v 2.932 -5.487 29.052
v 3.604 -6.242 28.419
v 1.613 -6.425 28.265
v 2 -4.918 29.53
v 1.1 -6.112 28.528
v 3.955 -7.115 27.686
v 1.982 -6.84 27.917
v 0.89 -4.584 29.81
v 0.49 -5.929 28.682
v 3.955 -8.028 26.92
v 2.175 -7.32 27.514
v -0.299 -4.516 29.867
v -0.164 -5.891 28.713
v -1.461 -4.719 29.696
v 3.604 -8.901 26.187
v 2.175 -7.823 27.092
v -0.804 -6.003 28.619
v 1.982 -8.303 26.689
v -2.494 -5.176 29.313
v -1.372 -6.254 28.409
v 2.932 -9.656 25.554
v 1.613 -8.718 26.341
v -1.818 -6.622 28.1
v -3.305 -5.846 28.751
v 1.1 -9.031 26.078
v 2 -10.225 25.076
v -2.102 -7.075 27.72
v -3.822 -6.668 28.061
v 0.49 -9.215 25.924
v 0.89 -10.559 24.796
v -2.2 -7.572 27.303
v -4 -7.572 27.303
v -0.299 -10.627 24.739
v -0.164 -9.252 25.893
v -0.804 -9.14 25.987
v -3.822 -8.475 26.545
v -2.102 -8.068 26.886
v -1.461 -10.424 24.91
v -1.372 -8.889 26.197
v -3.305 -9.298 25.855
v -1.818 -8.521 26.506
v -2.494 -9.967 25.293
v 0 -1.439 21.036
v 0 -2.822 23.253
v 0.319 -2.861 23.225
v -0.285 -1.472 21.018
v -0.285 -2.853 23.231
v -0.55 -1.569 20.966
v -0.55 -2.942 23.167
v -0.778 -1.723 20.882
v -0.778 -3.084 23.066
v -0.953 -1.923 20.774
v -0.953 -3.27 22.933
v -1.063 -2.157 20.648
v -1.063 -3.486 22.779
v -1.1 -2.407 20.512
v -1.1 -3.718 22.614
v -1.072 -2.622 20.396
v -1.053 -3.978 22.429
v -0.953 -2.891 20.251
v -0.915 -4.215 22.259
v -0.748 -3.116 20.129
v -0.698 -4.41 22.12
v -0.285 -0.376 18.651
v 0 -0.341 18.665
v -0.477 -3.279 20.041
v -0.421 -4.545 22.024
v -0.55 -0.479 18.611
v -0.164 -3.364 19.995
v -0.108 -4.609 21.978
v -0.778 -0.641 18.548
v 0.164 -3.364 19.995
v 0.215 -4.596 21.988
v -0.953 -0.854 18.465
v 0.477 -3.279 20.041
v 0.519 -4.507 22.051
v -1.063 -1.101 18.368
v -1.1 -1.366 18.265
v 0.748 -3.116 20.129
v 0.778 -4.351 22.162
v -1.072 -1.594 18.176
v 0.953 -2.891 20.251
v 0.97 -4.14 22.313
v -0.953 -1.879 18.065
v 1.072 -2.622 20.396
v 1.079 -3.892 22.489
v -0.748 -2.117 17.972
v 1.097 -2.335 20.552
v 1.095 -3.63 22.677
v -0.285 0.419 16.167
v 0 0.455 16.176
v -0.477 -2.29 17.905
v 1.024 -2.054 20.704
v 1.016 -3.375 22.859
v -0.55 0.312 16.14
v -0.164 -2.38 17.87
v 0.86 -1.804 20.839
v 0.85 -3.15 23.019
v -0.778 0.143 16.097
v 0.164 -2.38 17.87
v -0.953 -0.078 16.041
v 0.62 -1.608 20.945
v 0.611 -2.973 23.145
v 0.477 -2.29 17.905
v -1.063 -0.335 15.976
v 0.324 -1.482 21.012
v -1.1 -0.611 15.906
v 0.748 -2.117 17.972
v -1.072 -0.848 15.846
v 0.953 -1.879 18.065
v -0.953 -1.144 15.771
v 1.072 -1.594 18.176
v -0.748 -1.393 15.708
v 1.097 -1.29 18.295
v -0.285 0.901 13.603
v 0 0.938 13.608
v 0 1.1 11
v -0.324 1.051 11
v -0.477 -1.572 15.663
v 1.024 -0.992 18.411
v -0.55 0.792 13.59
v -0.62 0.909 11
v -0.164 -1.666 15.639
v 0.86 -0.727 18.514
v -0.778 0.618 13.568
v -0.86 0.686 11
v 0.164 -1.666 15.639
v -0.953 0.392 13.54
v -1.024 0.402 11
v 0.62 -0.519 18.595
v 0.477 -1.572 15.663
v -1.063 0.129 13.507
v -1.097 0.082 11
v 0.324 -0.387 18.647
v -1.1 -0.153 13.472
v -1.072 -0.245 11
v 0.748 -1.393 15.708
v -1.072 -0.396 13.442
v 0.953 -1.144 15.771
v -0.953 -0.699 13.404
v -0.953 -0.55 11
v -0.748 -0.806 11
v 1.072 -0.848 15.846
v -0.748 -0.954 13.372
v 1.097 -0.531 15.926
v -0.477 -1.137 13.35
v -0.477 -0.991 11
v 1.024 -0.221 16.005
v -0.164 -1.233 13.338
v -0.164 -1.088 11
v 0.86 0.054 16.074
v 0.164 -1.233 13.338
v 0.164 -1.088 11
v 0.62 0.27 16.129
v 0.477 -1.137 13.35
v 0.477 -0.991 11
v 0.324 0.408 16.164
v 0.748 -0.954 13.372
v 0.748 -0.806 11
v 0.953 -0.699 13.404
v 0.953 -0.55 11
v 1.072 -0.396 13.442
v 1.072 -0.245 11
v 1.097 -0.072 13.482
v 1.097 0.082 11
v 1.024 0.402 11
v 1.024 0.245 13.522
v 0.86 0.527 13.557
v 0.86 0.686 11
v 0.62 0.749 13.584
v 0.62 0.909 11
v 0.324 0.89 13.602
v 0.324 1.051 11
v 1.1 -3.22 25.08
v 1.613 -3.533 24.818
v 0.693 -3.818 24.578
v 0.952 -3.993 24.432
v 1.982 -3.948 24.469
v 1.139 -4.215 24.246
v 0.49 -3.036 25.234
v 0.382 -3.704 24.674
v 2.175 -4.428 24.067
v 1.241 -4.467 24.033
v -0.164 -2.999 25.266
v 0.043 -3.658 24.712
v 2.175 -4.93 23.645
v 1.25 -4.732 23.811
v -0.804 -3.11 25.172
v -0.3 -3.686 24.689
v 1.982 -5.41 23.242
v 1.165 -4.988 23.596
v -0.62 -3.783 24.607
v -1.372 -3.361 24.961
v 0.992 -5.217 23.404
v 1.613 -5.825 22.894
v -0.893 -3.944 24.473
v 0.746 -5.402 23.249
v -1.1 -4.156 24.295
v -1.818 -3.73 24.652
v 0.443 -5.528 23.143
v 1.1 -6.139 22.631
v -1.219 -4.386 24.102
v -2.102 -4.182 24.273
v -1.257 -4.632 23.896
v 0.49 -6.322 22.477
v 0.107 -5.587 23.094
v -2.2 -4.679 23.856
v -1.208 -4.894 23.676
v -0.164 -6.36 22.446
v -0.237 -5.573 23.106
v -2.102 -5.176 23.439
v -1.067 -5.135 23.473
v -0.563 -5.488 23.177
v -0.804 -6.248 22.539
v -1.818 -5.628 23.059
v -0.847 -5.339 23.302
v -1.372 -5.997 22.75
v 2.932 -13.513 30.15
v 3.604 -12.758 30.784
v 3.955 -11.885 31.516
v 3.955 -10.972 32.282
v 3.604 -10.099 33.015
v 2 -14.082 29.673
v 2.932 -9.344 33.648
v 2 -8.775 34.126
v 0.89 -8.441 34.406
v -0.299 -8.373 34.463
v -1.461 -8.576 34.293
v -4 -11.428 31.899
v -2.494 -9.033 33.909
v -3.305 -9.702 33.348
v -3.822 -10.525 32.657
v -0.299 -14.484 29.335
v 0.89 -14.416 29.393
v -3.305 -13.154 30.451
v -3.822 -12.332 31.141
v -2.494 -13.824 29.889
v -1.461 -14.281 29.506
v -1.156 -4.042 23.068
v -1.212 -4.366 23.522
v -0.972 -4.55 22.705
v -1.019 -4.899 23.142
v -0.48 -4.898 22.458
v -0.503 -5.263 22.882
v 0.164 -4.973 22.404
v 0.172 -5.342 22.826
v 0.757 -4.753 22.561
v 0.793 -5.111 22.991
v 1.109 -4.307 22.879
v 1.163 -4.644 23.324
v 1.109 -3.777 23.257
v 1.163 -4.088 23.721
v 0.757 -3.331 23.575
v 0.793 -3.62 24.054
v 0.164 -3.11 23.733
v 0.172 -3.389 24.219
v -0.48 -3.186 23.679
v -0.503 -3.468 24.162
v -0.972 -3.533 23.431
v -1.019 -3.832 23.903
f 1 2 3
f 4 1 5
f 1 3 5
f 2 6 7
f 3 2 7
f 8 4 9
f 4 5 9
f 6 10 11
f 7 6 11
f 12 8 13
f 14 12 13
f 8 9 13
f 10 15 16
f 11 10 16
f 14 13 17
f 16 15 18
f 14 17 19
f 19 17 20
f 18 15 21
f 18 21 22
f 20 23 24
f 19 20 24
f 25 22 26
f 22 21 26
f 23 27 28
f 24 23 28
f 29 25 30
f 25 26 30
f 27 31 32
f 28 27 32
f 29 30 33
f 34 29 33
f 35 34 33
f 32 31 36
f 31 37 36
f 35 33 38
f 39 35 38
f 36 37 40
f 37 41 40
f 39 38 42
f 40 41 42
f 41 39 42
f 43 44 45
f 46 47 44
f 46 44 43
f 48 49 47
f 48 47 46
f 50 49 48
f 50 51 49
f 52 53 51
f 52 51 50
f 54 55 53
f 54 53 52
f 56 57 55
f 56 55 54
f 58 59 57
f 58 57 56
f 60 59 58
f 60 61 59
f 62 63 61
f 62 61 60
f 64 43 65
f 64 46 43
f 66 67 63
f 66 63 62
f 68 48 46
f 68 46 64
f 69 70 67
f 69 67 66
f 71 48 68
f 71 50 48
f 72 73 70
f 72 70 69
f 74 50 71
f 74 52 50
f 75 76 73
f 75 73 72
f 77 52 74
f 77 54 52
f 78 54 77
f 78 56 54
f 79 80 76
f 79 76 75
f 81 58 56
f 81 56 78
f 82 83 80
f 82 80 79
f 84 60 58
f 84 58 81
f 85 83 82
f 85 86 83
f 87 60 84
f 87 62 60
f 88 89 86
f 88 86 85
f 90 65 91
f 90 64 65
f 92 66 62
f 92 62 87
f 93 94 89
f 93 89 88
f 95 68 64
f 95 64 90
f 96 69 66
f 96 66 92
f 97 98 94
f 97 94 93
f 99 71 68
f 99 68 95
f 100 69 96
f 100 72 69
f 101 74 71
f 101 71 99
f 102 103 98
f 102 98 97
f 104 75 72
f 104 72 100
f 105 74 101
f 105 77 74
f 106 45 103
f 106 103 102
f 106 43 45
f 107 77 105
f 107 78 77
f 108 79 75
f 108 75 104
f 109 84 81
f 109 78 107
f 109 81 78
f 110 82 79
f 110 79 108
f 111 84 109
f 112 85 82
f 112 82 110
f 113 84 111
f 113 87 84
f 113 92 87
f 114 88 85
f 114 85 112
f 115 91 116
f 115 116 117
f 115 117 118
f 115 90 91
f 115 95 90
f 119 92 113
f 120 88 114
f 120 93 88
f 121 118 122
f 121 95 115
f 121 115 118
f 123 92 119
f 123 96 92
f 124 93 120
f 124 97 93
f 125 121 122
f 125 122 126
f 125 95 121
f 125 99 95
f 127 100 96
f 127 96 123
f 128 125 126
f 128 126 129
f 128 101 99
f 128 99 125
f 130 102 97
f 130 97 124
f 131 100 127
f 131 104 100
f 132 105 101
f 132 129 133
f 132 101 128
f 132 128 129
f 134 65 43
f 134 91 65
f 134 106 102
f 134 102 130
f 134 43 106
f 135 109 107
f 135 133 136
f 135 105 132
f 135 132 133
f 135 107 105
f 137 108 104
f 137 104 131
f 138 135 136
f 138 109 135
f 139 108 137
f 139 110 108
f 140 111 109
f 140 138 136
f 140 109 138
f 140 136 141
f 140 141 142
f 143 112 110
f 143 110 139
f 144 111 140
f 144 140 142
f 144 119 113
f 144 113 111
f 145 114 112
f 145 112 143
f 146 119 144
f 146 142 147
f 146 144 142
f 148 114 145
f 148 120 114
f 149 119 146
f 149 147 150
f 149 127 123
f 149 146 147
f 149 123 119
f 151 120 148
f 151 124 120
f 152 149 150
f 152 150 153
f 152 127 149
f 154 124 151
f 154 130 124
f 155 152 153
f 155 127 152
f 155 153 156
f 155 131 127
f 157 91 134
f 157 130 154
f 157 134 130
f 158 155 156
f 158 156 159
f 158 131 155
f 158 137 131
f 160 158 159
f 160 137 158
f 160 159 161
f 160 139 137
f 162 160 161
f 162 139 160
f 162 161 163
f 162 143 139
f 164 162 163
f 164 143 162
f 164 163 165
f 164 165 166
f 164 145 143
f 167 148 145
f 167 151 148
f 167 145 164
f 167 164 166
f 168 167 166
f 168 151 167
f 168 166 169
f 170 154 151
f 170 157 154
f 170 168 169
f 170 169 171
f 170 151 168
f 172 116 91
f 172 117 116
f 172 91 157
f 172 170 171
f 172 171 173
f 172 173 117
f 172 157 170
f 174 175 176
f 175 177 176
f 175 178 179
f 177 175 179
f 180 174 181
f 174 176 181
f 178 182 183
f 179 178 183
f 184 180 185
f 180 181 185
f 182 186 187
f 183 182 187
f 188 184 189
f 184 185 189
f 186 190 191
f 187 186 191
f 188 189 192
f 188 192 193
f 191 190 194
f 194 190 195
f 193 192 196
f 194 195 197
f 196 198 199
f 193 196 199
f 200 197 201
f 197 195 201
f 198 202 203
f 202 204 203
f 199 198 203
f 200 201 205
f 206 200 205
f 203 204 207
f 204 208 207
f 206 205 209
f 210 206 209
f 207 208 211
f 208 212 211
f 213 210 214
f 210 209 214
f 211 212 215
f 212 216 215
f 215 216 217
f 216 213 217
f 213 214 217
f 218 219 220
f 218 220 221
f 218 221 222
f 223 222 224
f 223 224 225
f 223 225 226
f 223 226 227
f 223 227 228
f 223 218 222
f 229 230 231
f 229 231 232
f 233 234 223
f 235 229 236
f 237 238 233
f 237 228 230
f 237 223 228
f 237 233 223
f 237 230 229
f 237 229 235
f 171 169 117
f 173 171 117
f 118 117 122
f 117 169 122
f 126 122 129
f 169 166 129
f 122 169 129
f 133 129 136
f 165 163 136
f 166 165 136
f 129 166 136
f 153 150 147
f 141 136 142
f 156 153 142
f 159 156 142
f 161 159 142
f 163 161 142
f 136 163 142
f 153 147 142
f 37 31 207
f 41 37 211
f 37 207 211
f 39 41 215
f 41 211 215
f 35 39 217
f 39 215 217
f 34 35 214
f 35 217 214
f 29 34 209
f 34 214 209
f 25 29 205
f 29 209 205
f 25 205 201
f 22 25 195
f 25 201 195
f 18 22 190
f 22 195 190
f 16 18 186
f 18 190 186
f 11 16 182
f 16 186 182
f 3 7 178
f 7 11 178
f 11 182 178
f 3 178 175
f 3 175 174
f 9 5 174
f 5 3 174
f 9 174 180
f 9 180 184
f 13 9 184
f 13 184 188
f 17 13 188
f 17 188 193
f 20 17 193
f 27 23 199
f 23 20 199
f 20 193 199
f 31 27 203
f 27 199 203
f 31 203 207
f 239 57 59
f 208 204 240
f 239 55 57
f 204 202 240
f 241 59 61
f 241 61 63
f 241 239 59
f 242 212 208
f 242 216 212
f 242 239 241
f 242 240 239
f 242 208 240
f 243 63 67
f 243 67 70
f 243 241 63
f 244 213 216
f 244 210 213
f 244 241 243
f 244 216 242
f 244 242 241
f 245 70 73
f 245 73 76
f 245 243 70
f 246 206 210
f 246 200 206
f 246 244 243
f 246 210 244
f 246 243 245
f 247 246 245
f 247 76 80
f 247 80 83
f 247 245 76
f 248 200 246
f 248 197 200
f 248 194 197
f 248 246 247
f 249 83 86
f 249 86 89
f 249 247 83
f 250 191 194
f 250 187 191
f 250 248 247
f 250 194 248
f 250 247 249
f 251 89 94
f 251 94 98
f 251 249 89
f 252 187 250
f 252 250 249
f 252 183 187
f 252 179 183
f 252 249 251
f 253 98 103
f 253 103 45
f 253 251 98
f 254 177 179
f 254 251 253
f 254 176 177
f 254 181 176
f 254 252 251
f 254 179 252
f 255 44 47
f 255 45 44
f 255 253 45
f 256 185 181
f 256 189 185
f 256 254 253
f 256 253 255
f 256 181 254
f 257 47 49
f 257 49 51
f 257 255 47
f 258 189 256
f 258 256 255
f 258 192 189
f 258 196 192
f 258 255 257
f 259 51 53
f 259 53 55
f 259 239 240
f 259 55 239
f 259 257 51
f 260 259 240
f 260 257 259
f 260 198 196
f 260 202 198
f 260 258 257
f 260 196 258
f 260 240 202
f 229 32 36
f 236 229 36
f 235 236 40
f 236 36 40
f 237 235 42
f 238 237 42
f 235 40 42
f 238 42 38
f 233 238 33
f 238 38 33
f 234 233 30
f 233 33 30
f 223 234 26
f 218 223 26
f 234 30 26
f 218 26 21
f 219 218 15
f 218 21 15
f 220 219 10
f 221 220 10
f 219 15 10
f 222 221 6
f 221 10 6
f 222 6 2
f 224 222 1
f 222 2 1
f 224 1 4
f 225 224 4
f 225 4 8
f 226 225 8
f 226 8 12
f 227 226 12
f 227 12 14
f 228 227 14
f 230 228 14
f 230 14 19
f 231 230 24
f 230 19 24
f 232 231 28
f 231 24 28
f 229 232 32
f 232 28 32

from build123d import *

# Parameters (mm, degrees)
CONE008_ROLL_ANGLE           = -35.5
BOX001027045032_W            = 10
BOX001027045032_H            = 24
BOX001027045032_DEPTH        = 22
BOX001027045032_ROLL_ANGLE   = -35.5
BOX001027045031_W            = 10
BOX001027045031_H            = 24
BOX001027045031_DEPTH        = 22
TORUS007_R                   = 1.1
TORUS007_PITCH_ANGLE         = 90
CYLINDER137_R                = 4
CYLINDER137_DEPTH            = 6
CYLINDER137_ROLL_ANGLE       = -40
CYLINDER136_R                = 2.2
CYLINDER136_DEPTH            = 10
CYLINDER136_ROLL_ANGLE       = -40
FUSION112047_PLACEMENT_ANGLE = 180


with BuildPart() as cone008:
    # Cone008 → Cone008 (revolve)
    with BuildSketch(Plane.XZ):
        Polygon((0, 0), (1.1, 0), (1.3, 2), (0, 2), align=None)
    revolve(axis=Axis((0, 0, 0), (0, 0, 1)))


with BuildPart() as cone008_1:
    # Cone008 roll: moved
    add(cone008.part.rotate(Axis((0, 0, 0), (1, 0, 0)), CONE008_ROLL_ANGLE))


with BuildPart() as cone008_2:
    # Cone008 placement: moved
    add(cone008_1.part.moved(Location((0, 3.71769, 11.614059))))


with BuildPart() as cube085:
    # Box001027045032 → Box001027045032 (new body)
    with BuildSketch(Plane.XY):
        with Locations((5, 12)):
            Rectangle(BOX001027045032_W, BOX001027045032_H)
    extrude(amount=BOX001027045032_DEPTH)


with BuildPart() as cube085_1:
    # Box001027045032 roll: moved
    add(cube085.part.rotate(Axis((0, 0, 0), (1, 0, 0)), BOX001027045032_ROLL_ANGLE))


with BuildPart() as cube085_2:
    # Box001027045032 placement: moved
    add(cube085_1.part.moved(Location((-5, 0.461228, 13.936871))))


with BuildPart() as cube084:
    # Box001027045031 → Box001027045031 (new body)
    with BuildSketch(Plane(origin=(-5, -4, 0), x_dir=(1, 0, 0), z_dir=(0, 0, 1))):
        with Locations((5, 12)):
            Rectangle(BOX001027045031_W, BOX001027045031_H)
    extrude(amount=BOX001027045031_DEPTH)


with BuildPart() as cut074:
    # Torus007 → Torus007 (revolve)
    with BuildSketch(Plane.XZ):
        with Locations((20, 0)):
            Circle(TORUS007_R)
    revolve(axis=Axis((0, 0, 0), (0, 0, 1)))


with BuildPart() as cut074_1:
    # Torus007 pitch: moved
    add(cut074.part.rotate(Axis((0, 0, 0), (0, 1, 0)), TORUS007_PITCH_ANGLE))


with BuildPart() as cut074_2:
    # Torus007 placement: moved
    add(cut074_1.part.moved(Location((0, 20, 0))))

    # Common059: intersect Cube084
    add(cube084.part, mode=Mode.INTERSECT)

    # Cut074: cut Cube085
    add(cube085_2.part, mode=Mode.SUBTRACT)


with BuildPart() as cylinder195:
    # Cylinder137 → Cylinder137 (new body)
    with BuildSketch(Plane.XY):
        Circle(CYLINDER137_R)
    extrude(amount=CYLINDER137_DEPTH)


with BuildPart() as cylinder195_1:
    # Cylinder137 roll: moved
    add(cylinder195.part.rotate(Axis((0, 0, 0), (1, 0, 0)), CYLINDER137_ROLL_ANGLE))


with BuildPart() as cylinder195_2:
    # Cylinder137 placement: moved
    add(cylinder195_1.part.moved(Location((0, 7.571655, 16.302952))))


with BuildPart() as torroidal_hole010:
    # Cylinder136 → Cylinder136 (new body)
    with BuildSketch(Plane.XY):
        Circle(CYLINDER136_R)
    extrude(amount=CYLINDER136_DEPTH)


with BuildPart() as torroidal_hole010_1:
    # Cylinder136 roll: moved
    add(torroidal_hole010.part.rotate(Axis((0, 0, 0), (1, 0, 0)), CYLINDER136_ROLL_ANGLE))


with BuildPart() as torroidal_hole010_2:
    # Cylinder136 placement: moved
    add(torroidal_hole010_1.part.moved(Location((0, 4.679111, 12.855752))))

    # Fusion112047: union Cone008, Cut074, Cylinder195
    add(cone008_2.part)
    add(cut074_2.part)
    add(cylinder195_2.part)


with BuildPart() as torroidal_hole010_3:
    # Fusion112047 placement: moved
    add(torroidal_hole010_2.part.moved(Location((0, 0, 11))).rotate(Axis((0, 0, 11), (0, 0, 1)), FUSION112047_PLACEMENT_ANGLE))


solid = torroidal_hole010_3.part
